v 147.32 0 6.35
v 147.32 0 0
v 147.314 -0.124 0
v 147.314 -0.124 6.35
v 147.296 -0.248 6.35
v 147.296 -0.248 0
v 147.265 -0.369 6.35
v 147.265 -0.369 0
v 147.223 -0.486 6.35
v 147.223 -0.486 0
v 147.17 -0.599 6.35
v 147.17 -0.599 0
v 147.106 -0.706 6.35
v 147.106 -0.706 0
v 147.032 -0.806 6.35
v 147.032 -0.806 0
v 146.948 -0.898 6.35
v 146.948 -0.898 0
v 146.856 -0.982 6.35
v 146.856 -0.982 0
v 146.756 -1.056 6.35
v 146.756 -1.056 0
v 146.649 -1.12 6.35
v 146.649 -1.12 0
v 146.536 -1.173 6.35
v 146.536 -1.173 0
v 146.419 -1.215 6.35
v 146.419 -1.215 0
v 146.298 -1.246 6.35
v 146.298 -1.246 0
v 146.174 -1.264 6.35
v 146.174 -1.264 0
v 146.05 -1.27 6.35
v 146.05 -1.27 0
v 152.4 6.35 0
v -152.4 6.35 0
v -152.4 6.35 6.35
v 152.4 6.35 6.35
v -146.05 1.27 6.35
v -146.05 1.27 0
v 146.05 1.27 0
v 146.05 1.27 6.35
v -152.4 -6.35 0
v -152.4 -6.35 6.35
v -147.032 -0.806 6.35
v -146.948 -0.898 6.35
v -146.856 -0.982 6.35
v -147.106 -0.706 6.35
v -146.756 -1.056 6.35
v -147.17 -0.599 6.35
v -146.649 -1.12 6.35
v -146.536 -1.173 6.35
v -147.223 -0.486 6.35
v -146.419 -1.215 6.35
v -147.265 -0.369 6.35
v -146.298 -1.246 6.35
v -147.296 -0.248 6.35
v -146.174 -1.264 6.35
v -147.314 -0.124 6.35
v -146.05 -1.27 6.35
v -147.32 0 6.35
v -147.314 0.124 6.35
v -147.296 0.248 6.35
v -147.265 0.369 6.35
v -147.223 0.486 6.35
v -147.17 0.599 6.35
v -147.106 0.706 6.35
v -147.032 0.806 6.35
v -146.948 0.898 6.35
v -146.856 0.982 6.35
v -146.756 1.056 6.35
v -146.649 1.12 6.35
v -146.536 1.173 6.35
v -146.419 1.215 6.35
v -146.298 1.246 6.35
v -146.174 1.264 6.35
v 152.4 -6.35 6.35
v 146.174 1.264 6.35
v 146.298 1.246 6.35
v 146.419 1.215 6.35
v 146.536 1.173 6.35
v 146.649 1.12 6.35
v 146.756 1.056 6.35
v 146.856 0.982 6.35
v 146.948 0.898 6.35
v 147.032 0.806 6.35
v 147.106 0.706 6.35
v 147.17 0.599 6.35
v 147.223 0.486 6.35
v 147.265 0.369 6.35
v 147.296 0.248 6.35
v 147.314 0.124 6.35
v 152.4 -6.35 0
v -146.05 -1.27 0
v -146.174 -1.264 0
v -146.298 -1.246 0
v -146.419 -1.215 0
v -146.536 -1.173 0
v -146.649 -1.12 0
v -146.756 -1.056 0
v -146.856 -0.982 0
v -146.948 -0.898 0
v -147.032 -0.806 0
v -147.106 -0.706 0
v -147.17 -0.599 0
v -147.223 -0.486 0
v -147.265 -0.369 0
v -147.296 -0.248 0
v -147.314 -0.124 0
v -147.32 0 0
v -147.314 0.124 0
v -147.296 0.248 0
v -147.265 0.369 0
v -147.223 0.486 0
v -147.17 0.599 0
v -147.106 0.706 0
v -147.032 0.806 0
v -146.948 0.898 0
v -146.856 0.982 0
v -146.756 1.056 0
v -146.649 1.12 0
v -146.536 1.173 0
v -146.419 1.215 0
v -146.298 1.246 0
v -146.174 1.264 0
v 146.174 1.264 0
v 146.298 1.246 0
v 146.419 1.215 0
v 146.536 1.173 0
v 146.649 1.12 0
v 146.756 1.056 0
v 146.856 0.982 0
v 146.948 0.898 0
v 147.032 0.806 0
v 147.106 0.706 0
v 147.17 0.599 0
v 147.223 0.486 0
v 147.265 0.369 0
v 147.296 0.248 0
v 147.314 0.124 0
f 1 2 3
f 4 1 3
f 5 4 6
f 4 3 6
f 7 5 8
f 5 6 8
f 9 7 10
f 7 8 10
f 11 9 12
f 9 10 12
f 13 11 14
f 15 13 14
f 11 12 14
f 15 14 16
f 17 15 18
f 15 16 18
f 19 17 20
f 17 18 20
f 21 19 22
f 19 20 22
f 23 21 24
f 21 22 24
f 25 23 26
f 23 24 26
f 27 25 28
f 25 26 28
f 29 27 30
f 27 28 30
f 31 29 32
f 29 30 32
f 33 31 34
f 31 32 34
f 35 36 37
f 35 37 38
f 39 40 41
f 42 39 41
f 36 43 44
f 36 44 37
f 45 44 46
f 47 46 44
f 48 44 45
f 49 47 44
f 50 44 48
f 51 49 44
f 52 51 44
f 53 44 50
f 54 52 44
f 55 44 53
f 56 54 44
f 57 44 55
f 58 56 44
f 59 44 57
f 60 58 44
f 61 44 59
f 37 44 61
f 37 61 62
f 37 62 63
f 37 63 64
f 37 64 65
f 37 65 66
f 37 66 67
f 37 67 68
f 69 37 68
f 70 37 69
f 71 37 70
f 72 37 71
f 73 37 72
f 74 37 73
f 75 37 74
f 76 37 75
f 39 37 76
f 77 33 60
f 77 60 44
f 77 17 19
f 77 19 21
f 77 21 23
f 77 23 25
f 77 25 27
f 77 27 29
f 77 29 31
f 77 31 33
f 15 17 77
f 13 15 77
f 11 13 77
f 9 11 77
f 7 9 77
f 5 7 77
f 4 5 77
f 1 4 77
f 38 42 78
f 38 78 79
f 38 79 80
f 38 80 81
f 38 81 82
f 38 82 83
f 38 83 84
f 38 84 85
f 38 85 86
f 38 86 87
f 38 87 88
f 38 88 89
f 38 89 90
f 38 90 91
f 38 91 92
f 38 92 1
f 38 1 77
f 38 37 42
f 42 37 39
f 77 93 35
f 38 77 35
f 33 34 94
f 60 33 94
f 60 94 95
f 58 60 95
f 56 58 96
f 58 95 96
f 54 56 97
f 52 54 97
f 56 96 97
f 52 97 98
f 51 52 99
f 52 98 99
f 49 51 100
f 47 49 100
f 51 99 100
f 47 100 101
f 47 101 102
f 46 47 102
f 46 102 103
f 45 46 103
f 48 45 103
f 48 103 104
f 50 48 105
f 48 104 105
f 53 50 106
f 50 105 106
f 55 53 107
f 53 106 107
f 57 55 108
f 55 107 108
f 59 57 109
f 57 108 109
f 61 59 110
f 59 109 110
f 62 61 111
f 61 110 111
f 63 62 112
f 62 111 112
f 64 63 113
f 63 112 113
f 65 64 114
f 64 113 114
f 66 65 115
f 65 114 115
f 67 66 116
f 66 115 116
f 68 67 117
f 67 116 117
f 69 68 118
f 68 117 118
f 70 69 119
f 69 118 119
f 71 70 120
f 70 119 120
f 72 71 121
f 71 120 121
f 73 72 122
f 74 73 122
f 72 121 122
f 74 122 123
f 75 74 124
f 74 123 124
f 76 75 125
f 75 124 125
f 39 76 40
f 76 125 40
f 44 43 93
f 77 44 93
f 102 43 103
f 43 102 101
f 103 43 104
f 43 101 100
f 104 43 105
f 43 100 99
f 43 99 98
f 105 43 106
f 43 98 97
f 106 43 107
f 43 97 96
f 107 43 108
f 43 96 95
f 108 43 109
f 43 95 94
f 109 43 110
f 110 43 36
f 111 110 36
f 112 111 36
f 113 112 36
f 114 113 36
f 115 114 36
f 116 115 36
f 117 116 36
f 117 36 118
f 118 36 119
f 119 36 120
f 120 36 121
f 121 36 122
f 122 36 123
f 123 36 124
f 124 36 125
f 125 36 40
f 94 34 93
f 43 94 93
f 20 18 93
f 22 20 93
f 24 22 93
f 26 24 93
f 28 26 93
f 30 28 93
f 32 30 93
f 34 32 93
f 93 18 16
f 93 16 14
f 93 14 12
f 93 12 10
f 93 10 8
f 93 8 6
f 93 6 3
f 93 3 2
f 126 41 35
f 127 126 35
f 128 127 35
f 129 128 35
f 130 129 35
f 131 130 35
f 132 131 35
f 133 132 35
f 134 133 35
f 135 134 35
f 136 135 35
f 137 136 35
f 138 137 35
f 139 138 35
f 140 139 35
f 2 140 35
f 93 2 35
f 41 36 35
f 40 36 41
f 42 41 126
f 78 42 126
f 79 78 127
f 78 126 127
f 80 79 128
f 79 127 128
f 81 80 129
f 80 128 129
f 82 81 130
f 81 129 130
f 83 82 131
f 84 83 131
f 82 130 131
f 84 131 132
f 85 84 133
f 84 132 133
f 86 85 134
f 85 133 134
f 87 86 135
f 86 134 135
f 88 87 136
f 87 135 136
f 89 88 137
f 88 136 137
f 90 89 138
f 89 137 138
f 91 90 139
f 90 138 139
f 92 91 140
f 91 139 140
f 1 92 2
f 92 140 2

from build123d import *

# Parameters (mm, degrees)
SKETCH1_W           = 304.8
SKETCH1_H           = 12.7
BOSS_EXTRUDE1_DEPTH = 6.35


with BuildPart() as part:
    # Sketch1 → Boss-Extrude1 (new body)
    with BuildSketch(Plane.XY):
        Rectangle(SKETCH1_W, SKETCH1_H)
        with BuildLine():
            ThreePointArc((-146.05, -1.27), (-147.32, 0), (-146.05, 1.27))
            Line((-146.05, 1.27), (146.05, 1.27))
            ThreePointArc((146.05, 1.27), (146.948025612, 0.898025612), (147.32, 0))
            ThreePointArc((147.32, 0), (146.948025612, -0.898025612), (146.05, -1.27))
            Line((146.05, -1.27), (-146.05, -1.27))
        make_face(mode=Mode.SUBTRACT)
    extrude(amount=BOSS_EXTRUDE1_DEPTH)


solid = part.part
